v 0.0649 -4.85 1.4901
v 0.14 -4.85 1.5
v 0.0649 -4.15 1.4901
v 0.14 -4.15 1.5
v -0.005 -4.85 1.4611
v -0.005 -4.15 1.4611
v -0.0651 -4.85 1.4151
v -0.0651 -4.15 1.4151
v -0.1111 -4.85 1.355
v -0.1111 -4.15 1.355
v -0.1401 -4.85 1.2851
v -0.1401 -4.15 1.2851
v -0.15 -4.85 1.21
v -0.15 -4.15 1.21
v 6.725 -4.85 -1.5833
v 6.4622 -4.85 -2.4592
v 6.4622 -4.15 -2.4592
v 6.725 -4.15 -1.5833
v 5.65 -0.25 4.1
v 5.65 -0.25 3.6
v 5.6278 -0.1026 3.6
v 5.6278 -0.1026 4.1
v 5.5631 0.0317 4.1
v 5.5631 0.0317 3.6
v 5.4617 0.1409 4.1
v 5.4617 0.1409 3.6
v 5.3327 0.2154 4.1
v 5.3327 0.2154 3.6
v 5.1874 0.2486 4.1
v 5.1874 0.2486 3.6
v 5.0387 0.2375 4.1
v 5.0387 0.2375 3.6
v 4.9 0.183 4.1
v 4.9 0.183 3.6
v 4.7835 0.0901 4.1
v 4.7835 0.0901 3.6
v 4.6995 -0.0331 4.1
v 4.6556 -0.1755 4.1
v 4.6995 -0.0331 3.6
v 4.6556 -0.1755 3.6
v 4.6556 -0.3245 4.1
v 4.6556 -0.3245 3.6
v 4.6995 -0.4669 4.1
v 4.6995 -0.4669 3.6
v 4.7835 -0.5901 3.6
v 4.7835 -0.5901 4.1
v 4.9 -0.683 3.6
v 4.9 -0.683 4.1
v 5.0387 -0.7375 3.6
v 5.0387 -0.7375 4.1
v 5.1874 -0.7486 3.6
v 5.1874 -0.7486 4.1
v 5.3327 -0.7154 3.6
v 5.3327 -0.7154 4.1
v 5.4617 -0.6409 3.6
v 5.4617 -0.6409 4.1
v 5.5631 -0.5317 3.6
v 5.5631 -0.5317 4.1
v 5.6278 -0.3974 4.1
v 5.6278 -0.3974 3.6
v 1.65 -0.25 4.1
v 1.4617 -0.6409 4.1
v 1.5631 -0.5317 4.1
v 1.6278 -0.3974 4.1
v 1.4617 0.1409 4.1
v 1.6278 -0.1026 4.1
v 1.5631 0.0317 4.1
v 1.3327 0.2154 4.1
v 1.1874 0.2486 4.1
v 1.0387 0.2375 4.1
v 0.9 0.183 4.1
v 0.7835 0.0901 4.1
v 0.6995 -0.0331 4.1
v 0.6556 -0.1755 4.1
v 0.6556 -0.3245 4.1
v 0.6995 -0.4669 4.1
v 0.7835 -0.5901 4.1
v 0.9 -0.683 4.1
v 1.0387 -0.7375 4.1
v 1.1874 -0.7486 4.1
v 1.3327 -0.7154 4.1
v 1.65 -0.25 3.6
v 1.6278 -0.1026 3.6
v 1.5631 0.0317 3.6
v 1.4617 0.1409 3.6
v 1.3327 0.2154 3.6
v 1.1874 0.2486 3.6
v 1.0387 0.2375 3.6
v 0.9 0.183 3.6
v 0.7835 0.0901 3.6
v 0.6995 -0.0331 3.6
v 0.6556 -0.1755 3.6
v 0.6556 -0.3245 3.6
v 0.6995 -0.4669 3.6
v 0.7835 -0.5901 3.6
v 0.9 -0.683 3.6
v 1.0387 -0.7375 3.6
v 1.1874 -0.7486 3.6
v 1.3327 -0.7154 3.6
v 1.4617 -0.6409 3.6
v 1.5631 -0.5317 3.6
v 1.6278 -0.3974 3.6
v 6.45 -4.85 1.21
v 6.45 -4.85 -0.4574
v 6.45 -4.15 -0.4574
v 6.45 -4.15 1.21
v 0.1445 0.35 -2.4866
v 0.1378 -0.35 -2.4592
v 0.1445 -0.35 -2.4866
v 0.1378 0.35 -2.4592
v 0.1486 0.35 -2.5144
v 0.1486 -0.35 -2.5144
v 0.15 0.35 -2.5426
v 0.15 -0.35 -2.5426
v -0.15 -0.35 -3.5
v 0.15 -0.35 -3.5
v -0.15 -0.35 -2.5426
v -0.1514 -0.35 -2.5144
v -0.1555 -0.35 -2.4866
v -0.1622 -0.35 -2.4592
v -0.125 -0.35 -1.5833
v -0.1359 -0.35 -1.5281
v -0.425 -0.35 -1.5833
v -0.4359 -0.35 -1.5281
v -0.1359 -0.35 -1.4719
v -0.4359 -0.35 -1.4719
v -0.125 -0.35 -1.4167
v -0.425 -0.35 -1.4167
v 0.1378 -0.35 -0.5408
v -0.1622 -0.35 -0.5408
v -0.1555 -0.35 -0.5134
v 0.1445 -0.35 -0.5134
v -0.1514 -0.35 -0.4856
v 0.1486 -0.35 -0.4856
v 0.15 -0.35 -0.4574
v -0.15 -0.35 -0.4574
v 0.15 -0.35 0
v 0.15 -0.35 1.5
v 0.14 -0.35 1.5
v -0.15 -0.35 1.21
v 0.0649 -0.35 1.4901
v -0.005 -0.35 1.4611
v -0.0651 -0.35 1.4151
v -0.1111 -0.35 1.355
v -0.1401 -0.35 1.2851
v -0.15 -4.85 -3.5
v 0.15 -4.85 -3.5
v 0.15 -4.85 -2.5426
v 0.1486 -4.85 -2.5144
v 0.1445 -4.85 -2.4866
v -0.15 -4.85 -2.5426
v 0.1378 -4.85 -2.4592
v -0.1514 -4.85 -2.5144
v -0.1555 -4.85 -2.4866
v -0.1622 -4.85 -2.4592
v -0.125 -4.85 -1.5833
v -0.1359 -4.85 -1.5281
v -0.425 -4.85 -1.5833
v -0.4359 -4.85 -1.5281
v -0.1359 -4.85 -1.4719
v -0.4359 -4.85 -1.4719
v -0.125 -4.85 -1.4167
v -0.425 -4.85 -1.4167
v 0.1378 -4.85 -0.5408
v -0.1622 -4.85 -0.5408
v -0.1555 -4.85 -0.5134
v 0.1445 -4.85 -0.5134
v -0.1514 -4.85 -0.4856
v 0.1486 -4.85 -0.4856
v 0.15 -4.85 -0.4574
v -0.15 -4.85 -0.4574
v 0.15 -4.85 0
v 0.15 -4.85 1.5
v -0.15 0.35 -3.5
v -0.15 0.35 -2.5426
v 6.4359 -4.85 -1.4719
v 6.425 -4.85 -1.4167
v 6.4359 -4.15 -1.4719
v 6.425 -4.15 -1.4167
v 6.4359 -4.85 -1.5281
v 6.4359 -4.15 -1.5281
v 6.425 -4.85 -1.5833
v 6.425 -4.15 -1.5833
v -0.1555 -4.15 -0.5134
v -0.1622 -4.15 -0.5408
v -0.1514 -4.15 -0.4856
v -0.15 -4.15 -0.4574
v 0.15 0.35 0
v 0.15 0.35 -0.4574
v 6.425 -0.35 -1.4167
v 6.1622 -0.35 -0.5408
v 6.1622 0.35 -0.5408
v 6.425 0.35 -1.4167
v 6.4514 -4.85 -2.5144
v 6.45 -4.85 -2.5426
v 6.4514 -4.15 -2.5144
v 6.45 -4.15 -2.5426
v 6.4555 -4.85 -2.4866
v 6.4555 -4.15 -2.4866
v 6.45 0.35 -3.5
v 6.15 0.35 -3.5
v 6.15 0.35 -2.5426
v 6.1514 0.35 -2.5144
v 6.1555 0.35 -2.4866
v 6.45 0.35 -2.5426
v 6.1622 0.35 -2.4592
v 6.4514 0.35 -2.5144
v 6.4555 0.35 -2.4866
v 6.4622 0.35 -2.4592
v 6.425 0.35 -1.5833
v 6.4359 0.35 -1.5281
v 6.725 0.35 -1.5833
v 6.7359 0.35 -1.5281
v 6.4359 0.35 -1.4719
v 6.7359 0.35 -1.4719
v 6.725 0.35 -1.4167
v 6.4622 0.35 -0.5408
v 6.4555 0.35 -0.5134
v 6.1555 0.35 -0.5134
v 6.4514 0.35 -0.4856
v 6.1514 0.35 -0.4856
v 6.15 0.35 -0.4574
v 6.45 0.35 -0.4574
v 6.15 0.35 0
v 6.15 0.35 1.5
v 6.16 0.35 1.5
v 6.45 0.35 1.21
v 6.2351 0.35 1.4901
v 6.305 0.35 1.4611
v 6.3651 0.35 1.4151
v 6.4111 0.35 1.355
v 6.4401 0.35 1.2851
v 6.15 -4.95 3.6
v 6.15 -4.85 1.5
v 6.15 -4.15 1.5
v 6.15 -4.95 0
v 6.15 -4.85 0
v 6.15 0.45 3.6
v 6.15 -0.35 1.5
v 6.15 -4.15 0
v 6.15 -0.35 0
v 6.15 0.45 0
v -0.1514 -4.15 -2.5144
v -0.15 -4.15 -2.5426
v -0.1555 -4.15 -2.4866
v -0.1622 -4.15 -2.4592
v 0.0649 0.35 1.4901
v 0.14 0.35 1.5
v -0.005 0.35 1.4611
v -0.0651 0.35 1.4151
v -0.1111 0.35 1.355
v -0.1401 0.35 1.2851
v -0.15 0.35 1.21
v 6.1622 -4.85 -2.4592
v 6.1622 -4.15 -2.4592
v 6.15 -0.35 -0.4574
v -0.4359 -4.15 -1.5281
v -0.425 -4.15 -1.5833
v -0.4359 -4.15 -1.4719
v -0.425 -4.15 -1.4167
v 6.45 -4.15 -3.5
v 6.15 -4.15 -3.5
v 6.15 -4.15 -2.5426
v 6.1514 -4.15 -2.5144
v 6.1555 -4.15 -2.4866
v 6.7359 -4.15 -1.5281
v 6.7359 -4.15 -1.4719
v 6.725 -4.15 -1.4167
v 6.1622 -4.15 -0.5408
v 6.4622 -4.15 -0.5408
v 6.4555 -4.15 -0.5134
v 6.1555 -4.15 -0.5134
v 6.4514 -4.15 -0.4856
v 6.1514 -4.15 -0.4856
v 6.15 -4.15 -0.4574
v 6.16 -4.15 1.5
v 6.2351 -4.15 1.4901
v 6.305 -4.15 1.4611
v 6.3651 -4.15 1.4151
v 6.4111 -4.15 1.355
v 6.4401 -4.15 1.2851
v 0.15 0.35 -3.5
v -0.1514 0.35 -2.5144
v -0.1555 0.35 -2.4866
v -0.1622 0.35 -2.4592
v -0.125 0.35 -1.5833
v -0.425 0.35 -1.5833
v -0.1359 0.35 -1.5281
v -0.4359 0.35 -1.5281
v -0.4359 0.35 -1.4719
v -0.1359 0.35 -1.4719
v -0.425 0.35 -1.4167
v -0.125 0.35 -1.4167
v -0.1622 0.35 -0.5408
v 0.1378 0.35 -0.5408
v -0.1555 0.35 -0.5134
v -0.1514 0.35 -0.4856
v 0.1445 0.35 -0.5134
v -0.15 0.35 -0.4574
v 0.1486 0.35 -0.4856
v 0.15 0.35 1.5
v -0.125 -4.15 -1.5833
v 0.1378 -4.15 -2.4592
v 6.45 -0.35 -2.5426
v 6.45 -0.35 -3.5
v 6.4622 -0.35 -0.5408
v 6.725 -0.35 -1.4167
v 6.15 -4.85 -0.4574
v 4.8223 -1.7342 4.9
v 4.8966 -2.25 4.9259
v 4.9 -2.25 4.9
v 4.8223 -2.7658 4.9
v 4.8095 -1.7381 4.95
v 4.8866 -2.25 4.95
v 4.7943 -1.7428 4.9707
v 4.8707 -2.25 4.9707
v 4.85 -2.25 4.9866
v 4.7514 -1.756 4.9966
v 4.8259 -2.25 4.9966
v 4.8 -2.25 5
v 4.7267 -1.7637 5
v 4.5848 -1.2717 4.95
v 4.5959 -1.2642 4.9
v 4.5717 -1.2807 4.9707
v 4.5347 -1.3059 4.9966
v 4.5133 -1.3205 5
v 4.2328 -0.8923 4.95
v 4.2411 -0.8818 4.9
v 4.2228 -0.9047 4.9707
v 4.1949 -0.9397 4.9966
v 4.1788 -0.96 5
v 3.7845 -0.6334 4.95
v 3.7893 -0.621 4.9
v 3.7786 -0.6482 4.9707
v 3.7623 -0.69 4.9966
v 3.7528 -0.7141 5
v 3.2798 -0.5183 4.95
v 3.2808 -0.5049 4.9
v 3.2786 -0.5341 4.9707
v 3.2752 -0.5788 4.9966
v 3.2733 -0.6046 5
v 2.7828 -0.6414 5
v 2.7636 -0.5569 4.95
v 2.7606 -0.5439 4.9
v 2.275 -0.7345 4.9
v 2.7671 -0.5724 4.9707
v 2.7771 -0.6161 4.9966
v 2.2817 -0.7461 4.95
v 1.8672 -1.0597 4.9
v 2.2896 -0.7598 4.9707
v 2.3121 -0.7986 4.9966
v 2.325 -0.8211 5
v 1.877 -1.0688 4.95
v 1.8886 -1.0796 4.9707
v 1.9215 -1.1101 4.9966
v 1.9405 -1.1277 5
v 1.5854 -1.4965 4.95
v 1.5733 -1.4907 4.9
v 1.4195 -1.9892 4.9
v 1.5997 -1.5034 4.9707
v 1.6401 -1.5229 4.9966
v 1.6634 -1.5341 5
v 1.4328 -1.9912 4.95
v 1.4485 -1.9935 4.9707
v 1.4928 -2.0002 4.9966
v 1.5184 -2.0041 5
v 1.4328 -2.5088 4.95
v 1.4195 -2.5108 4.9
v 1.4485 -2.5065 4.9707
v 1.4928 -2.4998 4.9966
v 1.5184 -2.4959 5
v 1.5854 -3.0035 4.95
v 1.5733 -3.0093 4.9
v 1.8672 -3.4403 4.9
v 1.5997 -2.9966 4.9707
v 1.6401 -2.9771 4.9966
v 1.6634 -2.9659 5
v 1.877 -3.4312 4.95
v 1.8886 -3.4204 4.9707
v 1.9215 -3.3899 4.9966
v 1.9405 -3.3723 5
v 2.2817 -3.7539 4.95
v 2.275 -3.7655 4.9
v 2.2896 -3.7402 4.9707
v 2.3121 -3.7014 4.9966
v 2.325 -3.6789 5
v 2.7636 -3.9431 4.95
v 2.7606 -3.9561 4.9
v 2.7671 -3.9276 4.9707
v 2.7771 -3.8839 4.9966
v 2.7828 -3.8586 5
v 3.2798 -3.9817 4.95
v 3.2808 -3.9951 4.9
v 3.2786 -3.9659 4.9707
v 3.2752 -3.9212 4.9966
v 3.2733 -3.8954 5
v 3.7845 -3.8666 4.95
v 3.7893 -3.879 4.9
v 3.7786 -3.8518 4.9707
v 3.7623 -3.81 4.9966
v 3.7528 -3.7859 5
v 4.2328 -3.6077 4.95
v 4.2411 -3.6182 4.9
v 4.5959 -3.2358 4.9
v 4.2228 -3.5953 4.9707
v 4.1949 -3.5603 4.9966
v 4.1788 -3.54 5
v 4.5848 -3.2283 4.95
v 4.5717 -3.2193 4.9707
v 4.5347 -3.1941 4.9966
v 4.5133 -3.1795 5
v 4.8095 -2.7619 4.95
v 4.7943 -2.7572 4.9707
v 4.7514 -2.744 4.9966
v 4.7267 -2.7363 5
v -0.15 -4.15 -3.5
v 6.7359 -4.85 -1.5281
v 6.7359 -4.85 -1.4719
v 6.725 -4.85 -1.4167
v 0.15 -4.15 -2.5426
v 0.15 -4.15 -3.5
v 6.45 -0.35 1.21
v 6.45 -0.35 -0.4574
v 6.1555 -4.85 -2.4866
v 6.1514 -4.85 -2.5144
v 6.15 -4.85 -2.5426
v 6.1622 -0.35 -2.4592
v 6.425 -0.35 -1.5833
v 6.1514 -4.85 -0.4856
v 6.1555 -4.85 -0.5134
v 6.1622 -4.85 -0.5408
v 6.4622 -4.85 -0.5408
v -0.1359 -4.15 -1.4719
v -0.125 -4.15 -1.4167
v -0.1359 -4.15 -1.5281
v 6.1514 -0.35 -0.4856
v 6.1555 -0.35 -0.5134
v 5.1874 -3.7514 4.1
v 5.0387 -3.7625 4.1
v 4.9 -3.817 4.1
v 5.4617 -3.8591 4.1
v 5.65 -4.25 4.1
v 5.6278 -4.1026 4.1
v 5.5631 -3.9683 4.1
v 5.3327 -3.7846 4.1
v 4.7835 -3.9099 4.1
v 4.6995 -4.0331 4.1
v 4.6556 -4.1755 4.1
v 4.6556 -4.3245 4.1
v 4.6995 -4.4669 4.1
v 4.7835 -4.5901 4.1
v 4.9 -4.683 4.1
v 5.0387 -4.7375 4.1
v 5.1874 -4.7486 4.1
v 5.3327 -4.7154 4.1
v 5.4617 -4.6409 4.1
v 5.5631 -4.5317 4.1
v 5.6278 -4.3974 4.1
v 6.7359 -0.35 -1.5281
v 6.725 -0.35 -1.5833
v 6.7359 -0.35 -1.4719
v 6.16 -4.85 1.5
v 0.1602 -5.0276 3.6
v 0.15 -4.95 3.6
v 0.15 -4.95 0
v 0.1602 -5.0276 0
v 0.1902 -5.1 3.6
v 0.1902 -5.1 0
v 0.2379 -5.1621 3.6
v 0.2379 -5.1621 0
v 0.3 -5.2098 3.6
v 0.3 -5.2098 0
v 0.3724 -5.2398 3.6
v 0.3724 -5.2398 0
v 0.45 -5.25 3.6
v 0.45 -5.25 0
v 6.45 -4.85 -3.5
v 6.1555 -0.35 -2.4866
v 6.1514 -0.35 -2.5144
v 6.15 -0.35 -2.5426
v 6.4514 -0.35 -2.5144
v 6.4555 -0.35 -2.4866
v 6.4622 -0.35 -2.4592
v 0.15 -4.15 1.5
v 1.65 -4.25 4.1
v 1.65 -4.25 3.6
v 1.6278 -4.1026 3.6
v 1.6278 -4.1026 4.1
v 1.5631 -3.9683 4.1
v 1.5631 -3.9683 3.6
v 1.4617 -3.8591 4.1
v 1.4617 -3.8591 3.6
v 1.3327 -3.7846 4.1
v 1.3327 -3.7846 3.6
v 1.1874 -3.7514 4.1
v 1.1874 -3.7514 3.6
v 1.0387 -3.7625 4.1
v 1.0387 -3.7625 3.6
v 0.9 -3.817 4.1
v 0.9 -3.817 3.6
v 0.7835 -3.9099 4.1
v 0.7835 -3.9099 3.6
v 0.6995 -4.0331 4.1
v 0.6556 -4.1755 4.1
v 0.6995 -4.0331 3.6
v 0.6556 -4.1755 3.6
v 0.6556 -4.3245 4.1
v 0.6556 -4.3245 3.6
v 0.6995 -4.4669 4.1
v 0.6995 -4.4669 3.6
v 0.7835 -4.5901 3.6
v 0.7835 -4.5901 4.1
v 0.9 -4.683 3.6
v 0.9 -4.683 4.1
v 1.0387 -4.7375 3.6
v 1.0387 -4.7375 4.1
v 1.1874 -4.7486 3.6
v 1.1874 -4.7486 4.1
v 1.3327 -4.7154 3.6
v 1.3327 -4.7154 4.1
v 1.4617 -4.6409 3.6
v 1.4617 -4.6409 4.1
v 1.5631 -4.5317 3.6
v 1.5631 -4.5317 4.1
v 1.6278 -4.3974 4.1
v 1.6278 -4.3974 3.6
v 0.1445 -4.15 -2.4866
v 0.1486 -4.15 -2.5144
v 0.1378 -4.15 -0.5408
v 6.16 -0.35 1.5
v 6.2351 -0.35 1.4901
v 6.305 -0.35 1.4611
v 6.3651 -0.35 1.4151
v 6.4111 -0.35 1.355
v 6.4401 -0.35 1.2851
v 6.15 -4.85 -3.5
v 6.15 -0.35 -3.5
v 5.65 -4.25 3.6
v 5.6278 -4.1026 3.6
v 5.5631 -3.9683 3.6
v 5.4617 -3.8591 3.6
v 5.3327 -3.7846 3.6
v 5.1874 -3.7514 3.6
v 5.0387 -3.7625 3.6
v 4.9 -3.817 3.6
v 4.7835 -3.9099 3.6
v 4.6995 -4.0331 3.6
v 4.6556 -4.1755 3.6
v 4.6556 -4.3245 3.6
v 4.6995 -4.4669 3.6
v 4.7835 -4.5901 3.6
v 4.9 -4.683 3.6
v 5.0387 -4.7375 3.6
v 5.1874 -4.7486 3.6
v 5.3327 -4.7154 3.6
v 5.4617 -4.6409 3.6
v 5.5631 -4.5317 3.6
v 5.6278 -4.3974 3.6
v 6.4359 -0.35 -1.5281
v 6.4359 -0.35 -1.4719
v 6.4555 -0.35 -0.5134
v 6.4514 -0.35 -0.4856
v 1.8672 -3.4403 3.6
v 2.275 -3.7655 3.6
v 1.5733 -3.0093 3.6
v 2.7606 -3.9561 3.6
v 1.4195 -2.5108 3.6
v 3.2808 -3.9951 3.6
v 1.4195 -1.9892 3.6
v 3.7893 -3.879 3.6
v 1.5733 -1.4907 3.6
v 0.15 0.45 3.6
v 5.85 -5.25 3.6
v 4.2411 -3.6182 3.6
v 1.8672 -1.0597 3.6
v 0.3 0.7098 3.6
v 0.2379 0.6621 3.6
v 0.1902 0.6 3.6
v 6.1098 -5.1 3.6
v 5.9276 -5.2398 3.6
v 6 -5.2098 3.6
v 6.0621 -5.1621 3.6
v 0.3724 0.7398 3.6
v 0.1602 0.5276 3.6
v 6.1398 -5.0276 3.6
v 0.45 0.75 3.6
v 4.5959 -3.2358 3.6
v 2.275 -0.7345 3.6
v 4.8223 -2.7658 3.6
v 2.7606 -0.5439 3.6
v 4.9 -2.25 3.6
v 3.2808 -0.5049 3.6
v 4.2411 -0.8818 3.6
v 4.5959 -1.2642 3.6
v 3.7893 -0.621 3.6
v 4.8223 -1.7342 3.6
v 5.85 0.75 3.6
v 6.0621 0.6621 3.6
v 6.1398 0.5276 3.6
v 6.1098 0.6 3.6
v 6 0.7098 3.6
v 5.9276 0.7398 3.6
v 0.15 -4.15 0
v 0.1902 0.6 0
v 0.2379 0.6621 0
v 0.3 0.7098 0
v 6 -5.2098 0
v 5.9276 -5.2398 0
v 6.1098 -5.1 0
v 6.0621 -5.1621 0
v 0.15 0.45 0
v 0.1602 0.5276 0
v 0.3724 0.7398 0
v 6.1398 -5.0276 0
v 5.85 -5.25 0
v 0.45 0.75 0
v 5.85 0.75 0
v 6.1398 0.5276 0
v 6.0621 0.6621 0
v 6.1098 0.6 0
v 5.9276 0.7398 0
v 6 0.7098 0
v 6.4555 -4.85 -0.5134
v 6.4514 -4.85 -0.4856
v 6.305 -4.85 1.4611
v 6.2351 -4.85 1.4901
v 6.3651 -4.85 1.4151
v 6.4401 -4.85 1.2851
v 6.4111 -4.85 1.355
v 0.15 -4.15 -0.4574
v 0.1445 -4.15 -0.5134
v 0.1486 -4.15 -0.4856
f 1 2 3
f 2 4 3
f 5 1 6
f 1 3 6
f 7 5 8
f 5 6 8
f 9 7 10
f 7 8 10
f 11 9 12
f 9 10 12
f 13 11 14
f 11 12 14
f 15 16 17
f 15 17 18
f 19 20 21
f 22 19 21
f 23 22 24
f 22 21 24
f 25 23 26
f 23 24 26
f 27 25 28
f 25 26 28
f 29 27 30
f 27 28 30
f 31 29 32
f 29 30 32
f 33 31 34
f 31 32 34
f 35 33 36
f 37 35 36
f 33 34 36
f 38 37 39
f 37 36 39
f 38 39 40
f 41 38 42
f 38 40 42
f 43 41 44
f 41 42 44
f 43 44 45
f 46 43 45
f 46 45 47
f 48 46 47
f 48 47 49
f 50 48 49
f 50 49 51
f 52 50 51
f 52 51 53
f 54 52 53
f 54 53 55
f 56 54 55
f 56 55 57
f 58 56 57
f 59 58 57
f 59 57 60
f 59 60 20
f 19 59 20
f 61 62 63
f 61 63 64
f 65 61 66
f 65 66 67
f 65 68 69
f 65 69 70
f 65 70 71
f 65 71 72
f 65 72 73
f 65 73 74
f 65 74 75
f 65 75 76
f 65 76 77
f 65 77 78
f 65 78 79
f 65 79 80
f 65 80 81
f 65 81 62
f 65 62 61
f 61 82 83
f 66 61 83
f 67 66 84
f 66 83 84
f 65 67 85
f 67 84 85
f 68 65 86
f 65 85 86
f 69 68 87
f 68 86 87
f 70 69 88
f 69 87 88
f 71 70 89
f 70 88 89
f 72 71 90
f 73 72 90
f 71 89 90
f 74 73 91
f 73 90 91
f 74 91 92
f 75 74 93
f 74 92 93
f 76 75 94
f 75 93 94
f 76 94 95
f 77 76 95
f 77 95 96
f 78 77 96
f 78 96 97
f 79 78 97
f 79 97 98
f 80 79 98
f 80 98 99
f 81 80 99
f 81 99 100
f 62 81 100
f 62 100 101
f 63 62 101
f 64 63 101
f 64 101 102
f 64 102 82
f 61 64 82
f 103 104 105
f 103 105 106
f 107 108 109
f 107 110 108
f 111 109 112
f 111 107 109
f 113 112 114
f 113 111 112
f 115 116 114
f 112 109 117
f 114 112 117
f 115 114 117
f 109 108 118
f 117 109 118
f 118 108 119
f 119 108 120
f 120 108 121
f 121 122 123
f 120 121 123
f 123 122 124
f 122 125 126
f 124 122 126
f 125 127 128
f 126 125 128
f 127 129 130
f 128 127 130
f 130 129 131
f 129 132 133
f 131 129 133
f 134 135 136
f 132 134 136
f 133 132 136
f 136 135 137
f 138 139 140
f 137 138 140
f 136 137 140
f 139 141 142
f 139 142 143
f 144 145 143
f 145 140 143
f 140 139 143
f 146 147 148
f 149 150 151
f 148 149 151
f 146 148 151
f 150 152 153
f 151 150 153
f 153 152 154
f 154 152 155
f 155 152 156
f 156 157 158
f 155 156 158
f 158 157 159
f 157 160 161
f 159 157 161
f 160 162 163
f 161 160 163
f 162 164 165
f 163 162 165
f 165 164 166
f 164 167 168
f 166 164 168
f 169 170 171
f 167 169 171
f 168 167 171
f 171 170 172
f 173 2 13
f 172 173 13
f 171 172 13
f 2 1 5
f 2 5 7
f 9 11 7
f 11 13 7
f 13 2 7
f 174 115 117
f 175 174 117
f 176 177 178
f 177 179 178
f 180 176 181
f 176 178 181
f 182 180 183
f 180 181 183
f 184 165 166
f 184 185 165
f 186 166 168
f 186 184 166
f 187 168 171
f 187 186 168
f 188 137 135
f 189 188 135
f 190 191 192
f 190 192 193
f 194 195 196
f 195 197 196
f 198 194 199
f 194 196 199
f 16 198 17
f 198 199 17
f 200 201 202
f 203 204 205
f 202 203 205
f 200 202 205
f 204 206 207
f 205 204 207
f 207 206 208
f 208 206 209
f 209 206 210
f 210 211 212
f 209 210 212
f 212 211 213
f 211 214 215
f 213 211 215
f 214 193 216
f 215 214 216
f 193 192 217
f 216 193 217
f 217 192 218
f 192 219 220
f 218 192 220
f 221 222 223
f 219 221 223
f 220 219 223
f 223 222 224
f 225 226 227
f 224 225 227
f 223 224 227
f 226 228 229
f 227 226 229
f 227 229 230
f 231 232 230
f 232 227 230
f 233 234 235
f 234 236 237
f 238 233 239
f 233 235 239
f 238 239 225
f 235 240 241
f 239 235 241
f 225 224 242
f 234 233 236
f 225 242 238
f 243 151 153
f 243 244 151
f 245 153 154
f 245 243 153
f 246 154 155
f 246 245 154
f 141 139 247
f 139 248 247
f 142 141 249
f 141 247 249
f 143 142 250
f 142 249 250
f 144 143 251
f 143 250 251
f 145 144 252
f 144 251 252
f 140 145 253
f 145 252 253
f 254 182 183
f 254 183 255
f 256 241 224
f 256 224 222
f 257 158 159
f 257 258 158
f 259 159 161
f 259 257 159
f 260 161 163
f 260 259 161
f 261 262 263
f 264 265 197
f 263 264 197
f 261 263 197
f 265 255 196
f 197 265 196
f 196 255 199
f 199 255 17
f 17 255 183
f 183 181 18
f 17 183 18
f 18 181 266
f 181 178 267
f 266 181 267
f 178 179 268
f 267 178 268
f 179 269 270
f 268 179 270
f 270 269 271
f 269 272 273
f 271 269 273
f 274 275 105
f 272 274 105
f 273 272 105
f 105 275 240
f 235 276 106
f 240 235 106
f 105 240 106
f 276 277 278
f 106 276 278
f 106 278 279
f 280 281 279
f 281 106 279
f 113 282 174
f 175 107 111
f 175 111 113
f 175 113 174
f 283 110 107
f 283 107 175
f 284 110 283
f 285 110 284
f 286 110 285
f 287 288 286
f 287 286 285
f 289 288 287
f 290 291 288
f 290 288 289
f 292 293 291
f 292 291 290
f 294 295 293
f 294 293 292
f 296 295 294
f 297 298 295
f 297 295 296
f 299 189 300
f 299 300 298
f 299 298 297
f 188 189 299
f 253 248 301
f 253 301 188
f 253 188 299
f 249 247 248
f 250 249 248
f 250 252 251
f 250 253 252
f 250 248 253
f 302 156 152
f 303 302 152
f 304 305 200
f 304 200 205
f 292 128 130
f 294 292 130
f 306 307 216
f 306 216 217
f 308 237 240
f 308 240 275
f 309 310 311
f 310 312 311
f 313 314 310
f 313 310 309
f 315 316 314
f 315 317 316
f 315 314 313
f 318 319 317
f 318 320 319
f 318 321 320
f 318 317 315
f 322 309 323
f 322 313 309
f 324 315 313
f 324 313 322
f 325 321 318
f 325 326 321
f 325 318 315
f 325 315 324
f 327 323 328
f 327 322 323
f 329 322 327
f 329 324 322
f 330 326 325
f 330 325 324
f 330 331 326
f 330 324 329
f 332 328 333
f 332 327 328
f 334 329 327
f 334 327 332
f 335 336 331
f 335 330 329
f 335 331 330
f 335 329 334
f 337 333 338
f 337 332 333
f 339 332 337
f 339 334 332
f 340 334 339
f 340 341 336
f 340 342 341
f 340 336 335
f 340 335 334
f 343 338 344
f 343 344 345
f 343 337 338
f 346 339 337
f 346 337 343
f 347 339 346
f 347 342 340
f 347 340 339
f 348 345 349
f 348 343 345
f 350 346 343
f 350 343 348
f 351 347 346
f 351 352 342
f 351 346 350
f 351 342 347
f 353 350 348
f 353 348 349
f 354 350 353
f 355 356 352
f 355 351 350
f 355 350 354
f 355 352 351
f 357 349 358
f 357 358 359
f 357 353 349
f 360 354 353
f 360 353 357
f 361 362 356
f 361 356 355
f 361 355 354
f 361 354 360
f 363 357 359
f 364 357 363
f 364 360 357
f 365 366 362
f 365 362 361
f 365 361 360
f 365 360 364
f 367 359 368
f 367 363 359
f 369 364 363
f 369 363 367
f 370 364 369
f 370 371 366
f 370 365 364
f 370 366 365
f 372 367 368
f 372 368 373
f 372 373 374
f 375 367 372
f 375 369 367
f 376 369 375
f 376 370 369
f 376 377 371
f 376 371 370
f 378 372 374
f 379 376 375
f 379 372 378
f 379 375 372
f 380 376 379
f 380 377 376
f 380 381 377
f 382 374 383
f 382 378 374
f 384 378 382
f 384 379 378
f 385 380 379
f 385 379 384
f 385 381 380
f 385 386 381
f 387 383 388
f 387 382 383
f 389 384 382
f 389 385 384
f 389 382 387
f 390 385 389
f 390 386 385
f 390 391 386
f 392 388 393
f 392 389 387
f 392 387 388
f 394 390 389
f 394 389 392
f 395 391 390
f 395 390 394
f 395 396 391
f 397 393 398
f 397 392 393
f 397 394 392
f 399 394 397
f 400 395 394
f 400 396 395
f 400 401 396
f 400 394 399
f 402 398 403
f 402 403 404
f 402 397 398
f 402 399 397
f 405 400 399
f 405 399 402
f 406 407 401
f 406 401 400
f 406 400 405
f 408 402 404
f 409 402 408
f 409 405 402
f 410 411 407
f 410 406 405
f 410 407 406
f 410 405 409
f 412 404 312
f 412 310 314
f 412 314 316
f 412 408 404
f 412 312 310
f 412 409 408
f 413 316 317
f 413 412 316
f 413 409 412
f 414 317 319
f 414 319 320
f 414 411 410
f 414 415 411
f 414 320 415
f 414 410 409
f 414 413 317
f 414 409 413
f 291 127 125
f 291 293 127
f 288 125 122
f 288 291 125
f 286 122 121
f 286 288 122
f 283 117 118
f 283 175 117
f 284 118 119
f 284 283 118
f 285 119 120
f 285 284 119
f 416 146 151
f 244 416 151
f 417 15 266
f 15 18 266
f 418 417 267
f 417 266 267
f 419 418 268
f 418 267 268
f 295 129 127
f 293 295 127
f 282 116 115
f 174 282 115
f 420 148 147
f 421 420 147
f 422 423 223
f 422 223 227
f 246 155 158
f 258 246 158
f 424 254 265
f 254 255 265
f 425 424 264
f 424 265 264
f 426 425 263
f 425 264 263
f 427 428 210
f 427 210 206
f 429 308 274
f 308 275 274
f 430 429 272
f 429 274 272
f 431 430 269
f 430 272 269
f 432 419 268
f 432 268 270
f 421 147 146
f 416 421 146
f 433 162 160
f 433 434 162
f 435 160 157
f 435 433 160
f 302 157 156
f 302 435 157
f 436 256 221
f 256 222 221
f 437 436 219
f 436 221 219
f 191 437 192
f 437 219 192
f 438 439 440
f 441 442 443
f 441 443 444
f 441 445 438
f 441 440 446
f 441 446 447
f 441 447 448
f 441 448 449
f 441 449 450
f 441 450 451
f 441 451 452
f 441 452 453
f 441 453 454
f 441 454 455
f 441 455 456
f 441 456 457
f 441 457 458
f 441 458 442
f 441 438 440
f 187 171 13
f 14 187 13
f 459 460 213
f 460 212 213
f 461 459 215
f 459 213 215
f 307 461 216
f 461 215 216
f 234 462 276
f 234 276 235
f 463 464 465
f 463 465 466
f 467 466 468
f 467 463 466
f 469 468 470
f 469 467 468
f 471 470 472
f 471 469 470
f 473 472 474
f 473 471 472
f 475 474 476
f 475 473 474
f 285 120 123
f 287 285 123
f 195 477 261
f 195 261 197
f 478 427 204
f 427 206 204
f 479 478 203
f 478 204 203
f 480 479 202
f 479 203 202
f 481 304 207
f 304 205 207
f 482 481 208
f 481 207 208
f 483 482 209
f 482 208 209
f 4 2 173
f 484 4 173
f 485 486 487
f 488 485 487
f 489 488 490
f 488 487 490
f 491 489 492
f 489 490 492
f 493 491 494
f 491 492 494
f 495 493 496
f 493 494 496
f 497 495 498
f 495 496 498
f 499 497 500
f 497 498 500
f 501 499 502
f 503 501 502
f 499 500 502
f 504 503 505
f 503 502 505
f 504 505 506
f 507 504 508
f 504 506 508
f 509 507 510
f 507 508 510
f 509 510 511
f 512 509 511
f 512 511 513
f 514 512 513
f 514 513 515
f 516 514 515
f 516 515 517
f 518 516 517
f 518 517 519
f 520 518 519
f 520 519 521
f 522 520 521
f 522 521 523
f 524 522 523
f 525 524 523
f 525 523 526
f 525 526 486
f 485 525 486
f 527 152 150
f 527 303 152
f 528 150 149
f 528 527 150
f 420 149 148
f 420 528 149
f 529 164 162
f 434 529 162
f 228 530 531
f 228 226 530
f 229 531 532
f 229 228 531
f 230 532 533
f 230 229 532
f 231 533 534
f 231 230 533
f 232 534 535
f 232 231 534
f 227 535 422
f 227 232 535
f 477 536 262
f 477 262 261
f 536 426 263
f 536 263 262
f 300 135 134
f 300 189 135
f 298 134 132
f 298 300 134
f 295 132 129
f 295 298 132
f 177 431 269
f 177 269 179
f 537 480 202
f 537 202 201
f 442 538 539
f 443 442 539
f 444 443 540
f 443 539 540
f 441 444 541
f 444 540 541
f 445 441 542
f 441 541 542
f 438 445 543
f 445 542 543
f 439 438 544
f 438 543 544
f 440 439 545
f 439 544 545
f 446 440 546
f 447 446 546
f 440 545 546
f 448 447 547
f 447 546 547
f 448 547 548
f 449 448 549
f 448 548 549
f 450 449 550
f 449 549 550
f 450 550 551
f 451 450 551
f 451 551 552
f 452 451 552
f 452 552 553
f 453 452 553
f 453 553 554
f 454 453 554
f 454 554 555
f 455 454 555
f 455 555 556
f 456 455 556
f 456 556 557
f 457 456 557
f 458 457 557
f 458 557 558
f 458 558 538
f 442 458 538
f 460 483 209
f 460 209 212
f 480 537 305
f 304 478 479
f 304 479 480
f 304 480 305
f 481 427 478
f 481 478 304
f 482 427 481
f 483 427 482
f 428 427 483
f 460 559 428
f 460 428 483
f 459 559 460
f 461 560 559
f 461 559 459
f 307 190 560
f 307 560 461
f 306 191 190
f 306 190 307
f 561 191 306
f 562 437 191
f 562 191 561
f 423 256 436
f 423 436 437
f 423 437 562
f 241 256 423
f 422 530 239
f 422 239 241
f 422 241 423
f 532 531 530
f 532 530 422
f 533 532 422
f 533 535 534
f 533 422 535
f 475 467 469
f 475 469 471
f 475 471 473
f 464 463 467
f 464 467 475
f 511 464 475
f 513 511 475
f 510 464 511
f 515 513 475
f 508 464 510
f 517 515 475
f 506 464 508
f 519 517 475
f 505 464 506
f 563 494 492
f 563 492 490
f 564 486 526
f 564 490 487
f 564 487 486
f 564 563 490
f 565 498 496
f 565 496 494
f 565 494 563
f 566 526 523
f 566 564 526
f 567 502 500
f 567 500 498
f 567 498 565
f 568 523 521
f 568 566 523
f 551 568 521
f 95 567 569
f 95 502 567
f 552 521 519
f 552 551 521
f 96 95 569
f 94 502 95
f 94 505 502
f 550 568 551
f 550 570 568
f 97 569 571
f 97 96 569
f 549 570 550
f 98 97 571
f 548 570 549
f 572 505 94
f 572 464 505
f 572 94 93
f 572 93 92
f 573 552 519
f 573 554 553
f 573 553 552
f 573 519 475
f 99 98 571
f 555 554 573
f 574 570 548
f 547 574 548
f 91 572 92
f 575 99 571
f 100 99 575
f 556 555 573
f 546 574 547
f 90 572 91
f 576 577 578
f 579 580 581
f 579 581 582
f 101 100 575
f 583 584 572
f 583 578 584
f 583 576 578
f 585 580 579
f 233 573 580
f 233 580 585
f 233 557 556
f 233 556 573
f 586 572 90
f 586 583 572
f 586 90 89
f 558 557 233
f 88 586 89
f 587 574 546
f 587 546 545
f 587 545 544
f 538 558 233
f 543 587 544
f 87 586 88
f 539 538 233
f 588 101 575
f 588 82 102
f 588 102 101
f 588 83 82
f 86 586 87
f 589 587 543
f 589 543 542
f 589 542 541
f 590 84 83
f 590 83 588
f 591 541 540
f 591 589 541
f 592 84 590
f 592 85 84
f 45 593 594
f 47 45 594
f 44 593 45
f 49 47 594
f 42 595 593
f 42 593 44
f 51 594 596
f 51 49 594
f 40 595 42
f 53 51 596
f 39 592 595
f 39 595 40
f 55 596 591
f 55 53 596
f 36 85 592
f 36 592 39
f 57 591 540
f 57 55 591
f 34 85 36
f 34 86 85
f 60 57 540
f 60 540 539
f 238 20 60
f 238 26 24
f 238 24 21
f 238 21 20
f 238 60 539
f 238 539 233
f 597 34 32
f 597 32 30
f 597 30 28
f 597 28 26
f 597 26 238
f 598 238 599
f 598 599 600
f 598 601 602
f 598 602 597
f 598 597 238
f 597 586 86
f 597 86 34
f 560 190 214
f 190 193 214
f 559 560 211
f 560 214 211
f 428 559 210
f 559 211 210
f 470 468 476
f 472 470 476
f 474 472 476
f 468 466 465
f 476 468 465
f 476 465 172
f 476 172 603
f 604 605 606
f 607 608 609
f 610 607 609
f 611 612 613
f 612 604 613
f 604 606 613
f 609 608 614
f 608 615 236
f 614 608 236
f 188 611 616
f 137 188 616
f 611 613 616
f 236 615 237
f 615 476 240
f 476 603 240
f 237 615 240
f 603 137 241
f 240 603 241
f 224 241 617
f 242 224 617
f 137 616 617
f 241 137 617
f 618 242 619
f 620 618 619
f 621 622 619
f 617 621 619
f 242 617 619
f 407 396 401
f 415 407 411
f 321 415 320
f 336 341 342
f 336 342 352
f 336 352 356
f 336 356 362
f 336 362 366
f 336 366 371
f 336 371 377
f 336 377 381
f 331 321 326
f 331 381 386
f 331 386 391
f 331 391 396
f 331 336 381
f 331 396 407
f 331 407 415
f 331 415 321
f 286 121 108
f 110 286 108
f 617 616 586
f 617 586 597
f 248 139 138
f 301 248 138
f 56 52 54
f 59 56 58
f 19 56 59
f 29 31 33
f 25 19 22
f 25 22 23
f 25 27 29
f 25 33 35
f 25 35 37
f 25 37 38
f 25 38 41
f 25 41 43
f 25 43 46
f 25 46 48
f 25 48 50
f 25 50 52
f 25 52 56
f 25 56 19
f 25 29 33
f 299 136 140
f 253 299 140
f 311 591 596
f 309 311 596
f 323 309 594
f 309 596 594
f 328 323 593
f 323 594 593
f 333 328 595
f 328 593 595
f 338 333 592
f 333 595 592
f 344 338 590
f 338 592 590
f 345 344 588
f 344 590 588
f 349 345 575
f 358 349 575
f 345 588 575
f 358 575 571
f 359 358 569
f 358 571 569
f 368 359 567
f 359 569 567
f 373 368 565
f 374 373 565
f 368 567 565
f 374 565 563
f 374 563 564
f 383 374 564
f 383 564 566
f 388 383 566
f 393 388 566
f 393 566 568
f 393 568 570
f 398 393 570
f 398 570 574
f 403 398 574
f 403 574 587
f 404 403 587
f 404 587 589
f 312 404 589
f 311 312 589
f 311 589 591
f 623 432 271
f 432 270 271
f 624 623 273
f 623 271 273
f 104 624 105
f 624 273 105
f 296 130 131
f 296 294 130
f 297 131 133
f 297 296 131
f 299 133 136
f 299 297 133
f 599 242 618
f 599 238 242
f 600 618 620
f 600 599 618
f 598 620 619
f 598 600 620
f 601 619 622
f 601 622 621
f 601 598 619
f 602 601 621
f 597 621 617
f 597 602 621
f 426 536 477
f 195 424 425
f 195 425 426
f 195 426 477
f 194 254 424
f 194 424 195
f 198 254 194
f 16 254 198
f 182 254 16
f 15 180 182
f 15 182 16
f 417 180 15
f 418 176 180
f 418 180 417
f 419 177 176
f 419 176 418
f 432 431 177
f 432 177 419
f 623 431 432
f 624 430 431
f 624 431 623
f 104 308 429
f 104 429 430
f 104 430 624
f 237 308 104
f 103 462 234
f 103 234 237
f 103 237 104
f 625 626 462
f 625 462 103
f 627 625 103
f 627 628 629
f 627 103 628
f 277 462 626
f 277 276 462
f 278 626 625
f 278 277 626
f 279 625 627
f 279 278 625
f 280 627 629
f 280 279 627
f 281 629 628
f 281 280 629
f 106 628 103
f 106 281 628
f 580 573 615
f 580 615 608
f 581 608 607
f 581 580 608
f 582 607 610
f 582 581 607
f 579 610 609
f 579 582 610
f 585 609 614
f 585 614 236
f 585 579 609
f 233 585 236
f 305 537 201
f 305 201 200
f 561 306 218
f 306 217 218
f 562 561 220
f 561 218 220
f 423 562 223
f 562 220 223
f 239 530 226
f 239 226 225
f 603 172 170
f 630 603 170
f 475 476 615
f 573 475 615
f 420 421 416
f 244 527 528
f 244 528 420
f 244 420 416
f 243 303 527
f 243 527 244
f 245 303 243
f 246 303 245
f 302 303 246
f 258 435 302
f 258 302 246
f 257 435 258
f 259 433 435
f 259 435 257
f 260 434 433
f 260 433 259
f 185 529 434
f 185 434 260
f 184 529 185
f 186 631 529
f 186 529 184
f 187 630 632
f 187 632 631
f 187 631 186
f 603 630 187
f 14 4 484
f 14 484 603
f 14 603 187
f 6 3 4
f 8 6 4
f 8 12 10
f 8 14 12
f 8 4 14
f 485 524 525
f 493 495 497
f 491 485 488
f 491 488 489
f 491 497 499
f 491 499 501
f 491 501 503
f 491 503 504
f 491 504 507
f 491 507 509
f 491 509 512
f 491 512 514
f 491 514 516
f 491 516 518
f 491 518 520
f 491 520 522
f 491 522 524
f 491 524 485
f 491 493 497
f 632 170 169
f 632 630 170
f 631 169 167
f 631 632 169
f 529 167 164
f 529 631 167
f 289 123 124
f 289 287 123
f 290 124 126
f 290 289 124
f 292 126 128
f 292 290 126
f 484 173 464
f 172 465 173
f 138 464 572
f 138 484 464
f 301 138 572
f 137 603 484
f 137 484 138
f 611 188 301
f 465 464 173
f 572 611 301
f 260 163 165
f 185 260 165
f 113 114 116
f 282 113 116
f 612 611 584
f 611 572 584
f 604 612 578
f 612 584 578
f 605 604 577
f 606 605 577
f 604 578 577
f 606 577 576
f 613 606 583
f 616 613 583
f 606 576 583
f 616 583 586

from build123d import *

# Parameters (mm, degrees)
SKETCH001_W  = 6
SKETCH001_H  = 6
PAD001_DEPTH = 0.1
FILLET001_R  = 0.3
PAD008_DEPTH = 0.7
FILLET003_R  = 0.29
PAD009_DEPTH = 0.7
FILLET004_R  = 0.29
PAD010_DEPTH = 0.7
FILLET005_R  = 0.29
SKETCH_W     = 6
SKETCH_H     = 6
PAD_DEPTH    = 3.5
FILLET_R     = 0.3
SKETCH004_R  = 0.5
PAD003_DEPTH = 0.6
SKETCH003_R  = 0.5
PAD004_DEPTH = 0.6
SKETCH005_R  = 0.5
PAD002_DEPTH = 0.6
SKETCH002_R  = 0.5
PAD005_DEPTH = 0.6
SKETCH006_R  = 1.75
PAD006_DEPTH = 1.5
FILLET006_R  = 0.1
PAD007_DEPTH = 0.7
FILLET002_R  = 0.29


with BuildPart() as fillet001:
    # Sketch001 → Pad001 (new body)
    with BuildSketch(Plane.XY.offset(3.5)):
        with Locations((3.15, -2.25)):
            Rectangle(SKETCH001_W, SKETCH001_H)
    extrude(amount=PAD001_DEPTH)

    # Fillet001
    fillet001_edges = [fillet001.edges().sort_by_distance(p)[0] for p in [
        (6.15, -5.25, 3.55),
        (0.15, -5.25, 3.55),
        (6.15, 0.75, 3.55),
        (0.15, 0.75, 3.55),
    ]]
    fillet(fillet001_edges, radius=FILLET001_R)


with BuildPart() as fillet003:
    # Sketch008 → Pad008 (new body)
    with BuildSketch(Plane.XZ.offset(0.35)):
        Polygon((-0.15, 1.5), (0.15, 1.5), (0.15, -0.5), (-0.15, -1.5), (0.15, -2.5), (0.15, -3.5), (-0.15, -3.5), (-0.15, -2.5), (-0.45, -1.5), (-0.15, -0.5), align=None)
    extrude(amount=-PAD008_DEPTH)

    # Fillet003
    fillet003_edges = [fillet003.edges().sort_by_distance(p)[0] for p in [
        (-0.15, 0, -2.5),
        (-0.15, 0, -0.5),
        (-0.45, 0, -1.5),
        (-0.15, 0, 1.5),
        (0.15, 0, -0.5),
        (-0.15, 0, -1.5),
        (0.15, 0, -2.5),
    ]]
    fillet(fillet003_edges, radius=FILLET003_R)


with BuildPart() as fillet004:
    # Sketch009 → Pad009 (new body)
    with BuildSketch(Plane.XZ.offset(4.85)):
        Polygon((6.45, 1.5), (6.15, 1.5), (6.15, -0.5), (6.45, -1.5), (6.15, -2.5), (6.15, -3.5), (6.45, -3.5), (6.45, -2.5), (6.75, -1.5), (6.45, -0.5), align=None)
    extrude(amount=-PAD009_DEPTH)

    # Fillet004
    fillet004_edges = [fillet004.edges().sort_by_distance(p)[0] for p in [
        (6.45, -4.5, -2.5),
        (6.45, -4.5, -0.5),
        (6.75, -4.5, -1.5),
        (6.45, -4.5, 1.5),
        (6.15, -4.5, -0.5),
        (6.45, -4.5, -1.5),
        (6.15, -4.5, -2.5),
    ]]
    fillet(fillet004_edges, radius=FILLET004_R)


with BuildPart() as fillet005:
    # Sketch010 → Pad010 (new body)
    with BuildSketch(Plane.XZ.offset(0.35)):
        Polygon((6.45, 1.5), (6.15, 1.5), (6.15, -0.5), (6.45, -1.5), (6.15, -2.5), (6.15, -3.5), (6.45, -3.5), (6.45, -2.5), (6.75, -1.5), (6.45, -0.5), align=None)
    extrude(amount=-PAD010_DEPTH)

    # Fillet005
    fillet005_edges = [fillet005.edges().sort_by_distance(p)[0] for p in [
        (6.45, 0, -2.5),
        (6.45, 0, -0.5),
        (6.75, 0, -1.5),
        (6.45, 0, 1.5),
        (6.15, 0, -0.5),
        (6.45, 0, -1.5),
        (6.15, 0, -2.5),
    ]]
    fillet(fillet005_edges, radius=FILLET005_R)


with BuildPart() as fillet_body:
    # Sketch → Pad (new body)
    with BuildSketch(Plane.XY):
        with Locations((3.15, -2.25)):
            Rectangle(SKETCH_W, SKETCH_H)
    extrude(amount=PAD_DEPTH)

    # Fillet
    fillet_edges = [fillet_body.edges().sort_by_distance(p)[0] for p in [
        (6.15, 0.75, 1.75),
        (6.15, -5.25, 1.75),
        (0.15, -5.25, 1.75),
        (0.15, 0.75, 1.75),
    ]]
    fillet(fillet_edges, radius=FILLET_R)


with BuildPart() as pad003:
    # Pad003 base: copy of Fillet body
    add(fillet_body.part)

    # Sketch004 → Pad003 (new body)
    with BuildSketch(Plane.XY.offset(3.5)):
        with Locations((5.15, -0.25)):
            Circle(SKETCH004_R)
    extrude(amount=PAD003_DEPTH)


with BuildPart() as pad004:
    # Pad004 base: copy of Fillet body
    add(fillet_body.part)

    # Sketch003 → Pad004 (new body)
    with BuildSketch(Plane.XY.offset(3.5)):
        with Locations((5.15, -4.25)):
            Circle(SKETCH003_R)
    extrude(amount=PAD004_DEPTH)


with BuildPart() as pad002:
    # Pad002 base: copy of Fillet body
    add(fillet_body.part)

    # Sketch005 → Pad002 (new body)
    with BuildSketch(Plane.XY.offset(3.5)):
        with Locations((1.15, -0.25)):
            Circle(SKETCH005_R)
    extrude(amount=PAD002_DEPTH)


with BuildPart() as pad005:
    # Pad005 base: copy of Fillet body
    add(fillet_body.part)

    # Sketch002 → Pad005 (new body)
    with BuildSketch(Plane.XY.offset(3.5)):
        with Locations((1.15, -4.25)):
            Circle(SKETCH002_R)
    extrude(amount=PAD005_DEPTH)


with BuildPart() as fillet006:
    # Pad006 base: copy of Fillet body
    add(fillet_body.part)

    # Sketch006 → Pad006 (new body)
    with BuildSketch(Plane.XY.offset(3.5)):
        with Locations((3.15, -2.25)):
            Circle(SKETCH006_R)
    extrude(amount=PAD006_DEPTH)

    # Fillet006
    fillet006_edges = [fillet006.edges().sort_by_distance(p)[0] for p in [
        (1.4, -2.25, 5),
    ]]
    fillet(fillet006_edges, radius=FILLET006_R)


with BuildPart() as sw_push_6mm_h5mm:
    # Sketch007 → Pad007 (new body)
    with BuildSketch(Plane.XZ.offset(4.85)):
        Polygon((-0.15, 1.5), (0.15, 1.5), (0.15, -0.5), (-0.15, -1.5), (0.15, -2.5), (0.15, -3.5), (-0.15, -3.5), (-0.15, -2.5), (-0.45, -1.5), (-0.15, -0.5), align=None)
    extrude(amount=-PAD007_DEPTH)

    # Fillet002
    fillet002_edges = [sw_push_6mm_h5mm.edges().sort_by_distance(p)[0] for p in [
        (-0.15, -4.5, -2.5),
        (-0.15, -4.5, -0.5),
        (-0.45, -4.5, -1.5),
        (-0.15, -4.5, 1.5),
        (0.15, -4.5, -0.5),
        (-0.15, -4.5, -1.5),
        (0.15, -4.5, -2.5),
    ]]
    fillet(fillet002_edges, radius=FILLET002_R)

    # Fillet002_mp_cp: union Fillet001, Fillet003, Fillet004, Fillet005, Pad003, Pad004, Pad002, Pad005, Fillet006
    add(fillet001.part)
    add(fillet003.part)
    add(fillet004.part)
    add(fillet005.part)
    add(pad003.part)
    add(pad004.part)
    add(pad002.part)
    add(pad005.part)
    add(fillet006.part)


solid = sw_push_6mm_h5mm.part
